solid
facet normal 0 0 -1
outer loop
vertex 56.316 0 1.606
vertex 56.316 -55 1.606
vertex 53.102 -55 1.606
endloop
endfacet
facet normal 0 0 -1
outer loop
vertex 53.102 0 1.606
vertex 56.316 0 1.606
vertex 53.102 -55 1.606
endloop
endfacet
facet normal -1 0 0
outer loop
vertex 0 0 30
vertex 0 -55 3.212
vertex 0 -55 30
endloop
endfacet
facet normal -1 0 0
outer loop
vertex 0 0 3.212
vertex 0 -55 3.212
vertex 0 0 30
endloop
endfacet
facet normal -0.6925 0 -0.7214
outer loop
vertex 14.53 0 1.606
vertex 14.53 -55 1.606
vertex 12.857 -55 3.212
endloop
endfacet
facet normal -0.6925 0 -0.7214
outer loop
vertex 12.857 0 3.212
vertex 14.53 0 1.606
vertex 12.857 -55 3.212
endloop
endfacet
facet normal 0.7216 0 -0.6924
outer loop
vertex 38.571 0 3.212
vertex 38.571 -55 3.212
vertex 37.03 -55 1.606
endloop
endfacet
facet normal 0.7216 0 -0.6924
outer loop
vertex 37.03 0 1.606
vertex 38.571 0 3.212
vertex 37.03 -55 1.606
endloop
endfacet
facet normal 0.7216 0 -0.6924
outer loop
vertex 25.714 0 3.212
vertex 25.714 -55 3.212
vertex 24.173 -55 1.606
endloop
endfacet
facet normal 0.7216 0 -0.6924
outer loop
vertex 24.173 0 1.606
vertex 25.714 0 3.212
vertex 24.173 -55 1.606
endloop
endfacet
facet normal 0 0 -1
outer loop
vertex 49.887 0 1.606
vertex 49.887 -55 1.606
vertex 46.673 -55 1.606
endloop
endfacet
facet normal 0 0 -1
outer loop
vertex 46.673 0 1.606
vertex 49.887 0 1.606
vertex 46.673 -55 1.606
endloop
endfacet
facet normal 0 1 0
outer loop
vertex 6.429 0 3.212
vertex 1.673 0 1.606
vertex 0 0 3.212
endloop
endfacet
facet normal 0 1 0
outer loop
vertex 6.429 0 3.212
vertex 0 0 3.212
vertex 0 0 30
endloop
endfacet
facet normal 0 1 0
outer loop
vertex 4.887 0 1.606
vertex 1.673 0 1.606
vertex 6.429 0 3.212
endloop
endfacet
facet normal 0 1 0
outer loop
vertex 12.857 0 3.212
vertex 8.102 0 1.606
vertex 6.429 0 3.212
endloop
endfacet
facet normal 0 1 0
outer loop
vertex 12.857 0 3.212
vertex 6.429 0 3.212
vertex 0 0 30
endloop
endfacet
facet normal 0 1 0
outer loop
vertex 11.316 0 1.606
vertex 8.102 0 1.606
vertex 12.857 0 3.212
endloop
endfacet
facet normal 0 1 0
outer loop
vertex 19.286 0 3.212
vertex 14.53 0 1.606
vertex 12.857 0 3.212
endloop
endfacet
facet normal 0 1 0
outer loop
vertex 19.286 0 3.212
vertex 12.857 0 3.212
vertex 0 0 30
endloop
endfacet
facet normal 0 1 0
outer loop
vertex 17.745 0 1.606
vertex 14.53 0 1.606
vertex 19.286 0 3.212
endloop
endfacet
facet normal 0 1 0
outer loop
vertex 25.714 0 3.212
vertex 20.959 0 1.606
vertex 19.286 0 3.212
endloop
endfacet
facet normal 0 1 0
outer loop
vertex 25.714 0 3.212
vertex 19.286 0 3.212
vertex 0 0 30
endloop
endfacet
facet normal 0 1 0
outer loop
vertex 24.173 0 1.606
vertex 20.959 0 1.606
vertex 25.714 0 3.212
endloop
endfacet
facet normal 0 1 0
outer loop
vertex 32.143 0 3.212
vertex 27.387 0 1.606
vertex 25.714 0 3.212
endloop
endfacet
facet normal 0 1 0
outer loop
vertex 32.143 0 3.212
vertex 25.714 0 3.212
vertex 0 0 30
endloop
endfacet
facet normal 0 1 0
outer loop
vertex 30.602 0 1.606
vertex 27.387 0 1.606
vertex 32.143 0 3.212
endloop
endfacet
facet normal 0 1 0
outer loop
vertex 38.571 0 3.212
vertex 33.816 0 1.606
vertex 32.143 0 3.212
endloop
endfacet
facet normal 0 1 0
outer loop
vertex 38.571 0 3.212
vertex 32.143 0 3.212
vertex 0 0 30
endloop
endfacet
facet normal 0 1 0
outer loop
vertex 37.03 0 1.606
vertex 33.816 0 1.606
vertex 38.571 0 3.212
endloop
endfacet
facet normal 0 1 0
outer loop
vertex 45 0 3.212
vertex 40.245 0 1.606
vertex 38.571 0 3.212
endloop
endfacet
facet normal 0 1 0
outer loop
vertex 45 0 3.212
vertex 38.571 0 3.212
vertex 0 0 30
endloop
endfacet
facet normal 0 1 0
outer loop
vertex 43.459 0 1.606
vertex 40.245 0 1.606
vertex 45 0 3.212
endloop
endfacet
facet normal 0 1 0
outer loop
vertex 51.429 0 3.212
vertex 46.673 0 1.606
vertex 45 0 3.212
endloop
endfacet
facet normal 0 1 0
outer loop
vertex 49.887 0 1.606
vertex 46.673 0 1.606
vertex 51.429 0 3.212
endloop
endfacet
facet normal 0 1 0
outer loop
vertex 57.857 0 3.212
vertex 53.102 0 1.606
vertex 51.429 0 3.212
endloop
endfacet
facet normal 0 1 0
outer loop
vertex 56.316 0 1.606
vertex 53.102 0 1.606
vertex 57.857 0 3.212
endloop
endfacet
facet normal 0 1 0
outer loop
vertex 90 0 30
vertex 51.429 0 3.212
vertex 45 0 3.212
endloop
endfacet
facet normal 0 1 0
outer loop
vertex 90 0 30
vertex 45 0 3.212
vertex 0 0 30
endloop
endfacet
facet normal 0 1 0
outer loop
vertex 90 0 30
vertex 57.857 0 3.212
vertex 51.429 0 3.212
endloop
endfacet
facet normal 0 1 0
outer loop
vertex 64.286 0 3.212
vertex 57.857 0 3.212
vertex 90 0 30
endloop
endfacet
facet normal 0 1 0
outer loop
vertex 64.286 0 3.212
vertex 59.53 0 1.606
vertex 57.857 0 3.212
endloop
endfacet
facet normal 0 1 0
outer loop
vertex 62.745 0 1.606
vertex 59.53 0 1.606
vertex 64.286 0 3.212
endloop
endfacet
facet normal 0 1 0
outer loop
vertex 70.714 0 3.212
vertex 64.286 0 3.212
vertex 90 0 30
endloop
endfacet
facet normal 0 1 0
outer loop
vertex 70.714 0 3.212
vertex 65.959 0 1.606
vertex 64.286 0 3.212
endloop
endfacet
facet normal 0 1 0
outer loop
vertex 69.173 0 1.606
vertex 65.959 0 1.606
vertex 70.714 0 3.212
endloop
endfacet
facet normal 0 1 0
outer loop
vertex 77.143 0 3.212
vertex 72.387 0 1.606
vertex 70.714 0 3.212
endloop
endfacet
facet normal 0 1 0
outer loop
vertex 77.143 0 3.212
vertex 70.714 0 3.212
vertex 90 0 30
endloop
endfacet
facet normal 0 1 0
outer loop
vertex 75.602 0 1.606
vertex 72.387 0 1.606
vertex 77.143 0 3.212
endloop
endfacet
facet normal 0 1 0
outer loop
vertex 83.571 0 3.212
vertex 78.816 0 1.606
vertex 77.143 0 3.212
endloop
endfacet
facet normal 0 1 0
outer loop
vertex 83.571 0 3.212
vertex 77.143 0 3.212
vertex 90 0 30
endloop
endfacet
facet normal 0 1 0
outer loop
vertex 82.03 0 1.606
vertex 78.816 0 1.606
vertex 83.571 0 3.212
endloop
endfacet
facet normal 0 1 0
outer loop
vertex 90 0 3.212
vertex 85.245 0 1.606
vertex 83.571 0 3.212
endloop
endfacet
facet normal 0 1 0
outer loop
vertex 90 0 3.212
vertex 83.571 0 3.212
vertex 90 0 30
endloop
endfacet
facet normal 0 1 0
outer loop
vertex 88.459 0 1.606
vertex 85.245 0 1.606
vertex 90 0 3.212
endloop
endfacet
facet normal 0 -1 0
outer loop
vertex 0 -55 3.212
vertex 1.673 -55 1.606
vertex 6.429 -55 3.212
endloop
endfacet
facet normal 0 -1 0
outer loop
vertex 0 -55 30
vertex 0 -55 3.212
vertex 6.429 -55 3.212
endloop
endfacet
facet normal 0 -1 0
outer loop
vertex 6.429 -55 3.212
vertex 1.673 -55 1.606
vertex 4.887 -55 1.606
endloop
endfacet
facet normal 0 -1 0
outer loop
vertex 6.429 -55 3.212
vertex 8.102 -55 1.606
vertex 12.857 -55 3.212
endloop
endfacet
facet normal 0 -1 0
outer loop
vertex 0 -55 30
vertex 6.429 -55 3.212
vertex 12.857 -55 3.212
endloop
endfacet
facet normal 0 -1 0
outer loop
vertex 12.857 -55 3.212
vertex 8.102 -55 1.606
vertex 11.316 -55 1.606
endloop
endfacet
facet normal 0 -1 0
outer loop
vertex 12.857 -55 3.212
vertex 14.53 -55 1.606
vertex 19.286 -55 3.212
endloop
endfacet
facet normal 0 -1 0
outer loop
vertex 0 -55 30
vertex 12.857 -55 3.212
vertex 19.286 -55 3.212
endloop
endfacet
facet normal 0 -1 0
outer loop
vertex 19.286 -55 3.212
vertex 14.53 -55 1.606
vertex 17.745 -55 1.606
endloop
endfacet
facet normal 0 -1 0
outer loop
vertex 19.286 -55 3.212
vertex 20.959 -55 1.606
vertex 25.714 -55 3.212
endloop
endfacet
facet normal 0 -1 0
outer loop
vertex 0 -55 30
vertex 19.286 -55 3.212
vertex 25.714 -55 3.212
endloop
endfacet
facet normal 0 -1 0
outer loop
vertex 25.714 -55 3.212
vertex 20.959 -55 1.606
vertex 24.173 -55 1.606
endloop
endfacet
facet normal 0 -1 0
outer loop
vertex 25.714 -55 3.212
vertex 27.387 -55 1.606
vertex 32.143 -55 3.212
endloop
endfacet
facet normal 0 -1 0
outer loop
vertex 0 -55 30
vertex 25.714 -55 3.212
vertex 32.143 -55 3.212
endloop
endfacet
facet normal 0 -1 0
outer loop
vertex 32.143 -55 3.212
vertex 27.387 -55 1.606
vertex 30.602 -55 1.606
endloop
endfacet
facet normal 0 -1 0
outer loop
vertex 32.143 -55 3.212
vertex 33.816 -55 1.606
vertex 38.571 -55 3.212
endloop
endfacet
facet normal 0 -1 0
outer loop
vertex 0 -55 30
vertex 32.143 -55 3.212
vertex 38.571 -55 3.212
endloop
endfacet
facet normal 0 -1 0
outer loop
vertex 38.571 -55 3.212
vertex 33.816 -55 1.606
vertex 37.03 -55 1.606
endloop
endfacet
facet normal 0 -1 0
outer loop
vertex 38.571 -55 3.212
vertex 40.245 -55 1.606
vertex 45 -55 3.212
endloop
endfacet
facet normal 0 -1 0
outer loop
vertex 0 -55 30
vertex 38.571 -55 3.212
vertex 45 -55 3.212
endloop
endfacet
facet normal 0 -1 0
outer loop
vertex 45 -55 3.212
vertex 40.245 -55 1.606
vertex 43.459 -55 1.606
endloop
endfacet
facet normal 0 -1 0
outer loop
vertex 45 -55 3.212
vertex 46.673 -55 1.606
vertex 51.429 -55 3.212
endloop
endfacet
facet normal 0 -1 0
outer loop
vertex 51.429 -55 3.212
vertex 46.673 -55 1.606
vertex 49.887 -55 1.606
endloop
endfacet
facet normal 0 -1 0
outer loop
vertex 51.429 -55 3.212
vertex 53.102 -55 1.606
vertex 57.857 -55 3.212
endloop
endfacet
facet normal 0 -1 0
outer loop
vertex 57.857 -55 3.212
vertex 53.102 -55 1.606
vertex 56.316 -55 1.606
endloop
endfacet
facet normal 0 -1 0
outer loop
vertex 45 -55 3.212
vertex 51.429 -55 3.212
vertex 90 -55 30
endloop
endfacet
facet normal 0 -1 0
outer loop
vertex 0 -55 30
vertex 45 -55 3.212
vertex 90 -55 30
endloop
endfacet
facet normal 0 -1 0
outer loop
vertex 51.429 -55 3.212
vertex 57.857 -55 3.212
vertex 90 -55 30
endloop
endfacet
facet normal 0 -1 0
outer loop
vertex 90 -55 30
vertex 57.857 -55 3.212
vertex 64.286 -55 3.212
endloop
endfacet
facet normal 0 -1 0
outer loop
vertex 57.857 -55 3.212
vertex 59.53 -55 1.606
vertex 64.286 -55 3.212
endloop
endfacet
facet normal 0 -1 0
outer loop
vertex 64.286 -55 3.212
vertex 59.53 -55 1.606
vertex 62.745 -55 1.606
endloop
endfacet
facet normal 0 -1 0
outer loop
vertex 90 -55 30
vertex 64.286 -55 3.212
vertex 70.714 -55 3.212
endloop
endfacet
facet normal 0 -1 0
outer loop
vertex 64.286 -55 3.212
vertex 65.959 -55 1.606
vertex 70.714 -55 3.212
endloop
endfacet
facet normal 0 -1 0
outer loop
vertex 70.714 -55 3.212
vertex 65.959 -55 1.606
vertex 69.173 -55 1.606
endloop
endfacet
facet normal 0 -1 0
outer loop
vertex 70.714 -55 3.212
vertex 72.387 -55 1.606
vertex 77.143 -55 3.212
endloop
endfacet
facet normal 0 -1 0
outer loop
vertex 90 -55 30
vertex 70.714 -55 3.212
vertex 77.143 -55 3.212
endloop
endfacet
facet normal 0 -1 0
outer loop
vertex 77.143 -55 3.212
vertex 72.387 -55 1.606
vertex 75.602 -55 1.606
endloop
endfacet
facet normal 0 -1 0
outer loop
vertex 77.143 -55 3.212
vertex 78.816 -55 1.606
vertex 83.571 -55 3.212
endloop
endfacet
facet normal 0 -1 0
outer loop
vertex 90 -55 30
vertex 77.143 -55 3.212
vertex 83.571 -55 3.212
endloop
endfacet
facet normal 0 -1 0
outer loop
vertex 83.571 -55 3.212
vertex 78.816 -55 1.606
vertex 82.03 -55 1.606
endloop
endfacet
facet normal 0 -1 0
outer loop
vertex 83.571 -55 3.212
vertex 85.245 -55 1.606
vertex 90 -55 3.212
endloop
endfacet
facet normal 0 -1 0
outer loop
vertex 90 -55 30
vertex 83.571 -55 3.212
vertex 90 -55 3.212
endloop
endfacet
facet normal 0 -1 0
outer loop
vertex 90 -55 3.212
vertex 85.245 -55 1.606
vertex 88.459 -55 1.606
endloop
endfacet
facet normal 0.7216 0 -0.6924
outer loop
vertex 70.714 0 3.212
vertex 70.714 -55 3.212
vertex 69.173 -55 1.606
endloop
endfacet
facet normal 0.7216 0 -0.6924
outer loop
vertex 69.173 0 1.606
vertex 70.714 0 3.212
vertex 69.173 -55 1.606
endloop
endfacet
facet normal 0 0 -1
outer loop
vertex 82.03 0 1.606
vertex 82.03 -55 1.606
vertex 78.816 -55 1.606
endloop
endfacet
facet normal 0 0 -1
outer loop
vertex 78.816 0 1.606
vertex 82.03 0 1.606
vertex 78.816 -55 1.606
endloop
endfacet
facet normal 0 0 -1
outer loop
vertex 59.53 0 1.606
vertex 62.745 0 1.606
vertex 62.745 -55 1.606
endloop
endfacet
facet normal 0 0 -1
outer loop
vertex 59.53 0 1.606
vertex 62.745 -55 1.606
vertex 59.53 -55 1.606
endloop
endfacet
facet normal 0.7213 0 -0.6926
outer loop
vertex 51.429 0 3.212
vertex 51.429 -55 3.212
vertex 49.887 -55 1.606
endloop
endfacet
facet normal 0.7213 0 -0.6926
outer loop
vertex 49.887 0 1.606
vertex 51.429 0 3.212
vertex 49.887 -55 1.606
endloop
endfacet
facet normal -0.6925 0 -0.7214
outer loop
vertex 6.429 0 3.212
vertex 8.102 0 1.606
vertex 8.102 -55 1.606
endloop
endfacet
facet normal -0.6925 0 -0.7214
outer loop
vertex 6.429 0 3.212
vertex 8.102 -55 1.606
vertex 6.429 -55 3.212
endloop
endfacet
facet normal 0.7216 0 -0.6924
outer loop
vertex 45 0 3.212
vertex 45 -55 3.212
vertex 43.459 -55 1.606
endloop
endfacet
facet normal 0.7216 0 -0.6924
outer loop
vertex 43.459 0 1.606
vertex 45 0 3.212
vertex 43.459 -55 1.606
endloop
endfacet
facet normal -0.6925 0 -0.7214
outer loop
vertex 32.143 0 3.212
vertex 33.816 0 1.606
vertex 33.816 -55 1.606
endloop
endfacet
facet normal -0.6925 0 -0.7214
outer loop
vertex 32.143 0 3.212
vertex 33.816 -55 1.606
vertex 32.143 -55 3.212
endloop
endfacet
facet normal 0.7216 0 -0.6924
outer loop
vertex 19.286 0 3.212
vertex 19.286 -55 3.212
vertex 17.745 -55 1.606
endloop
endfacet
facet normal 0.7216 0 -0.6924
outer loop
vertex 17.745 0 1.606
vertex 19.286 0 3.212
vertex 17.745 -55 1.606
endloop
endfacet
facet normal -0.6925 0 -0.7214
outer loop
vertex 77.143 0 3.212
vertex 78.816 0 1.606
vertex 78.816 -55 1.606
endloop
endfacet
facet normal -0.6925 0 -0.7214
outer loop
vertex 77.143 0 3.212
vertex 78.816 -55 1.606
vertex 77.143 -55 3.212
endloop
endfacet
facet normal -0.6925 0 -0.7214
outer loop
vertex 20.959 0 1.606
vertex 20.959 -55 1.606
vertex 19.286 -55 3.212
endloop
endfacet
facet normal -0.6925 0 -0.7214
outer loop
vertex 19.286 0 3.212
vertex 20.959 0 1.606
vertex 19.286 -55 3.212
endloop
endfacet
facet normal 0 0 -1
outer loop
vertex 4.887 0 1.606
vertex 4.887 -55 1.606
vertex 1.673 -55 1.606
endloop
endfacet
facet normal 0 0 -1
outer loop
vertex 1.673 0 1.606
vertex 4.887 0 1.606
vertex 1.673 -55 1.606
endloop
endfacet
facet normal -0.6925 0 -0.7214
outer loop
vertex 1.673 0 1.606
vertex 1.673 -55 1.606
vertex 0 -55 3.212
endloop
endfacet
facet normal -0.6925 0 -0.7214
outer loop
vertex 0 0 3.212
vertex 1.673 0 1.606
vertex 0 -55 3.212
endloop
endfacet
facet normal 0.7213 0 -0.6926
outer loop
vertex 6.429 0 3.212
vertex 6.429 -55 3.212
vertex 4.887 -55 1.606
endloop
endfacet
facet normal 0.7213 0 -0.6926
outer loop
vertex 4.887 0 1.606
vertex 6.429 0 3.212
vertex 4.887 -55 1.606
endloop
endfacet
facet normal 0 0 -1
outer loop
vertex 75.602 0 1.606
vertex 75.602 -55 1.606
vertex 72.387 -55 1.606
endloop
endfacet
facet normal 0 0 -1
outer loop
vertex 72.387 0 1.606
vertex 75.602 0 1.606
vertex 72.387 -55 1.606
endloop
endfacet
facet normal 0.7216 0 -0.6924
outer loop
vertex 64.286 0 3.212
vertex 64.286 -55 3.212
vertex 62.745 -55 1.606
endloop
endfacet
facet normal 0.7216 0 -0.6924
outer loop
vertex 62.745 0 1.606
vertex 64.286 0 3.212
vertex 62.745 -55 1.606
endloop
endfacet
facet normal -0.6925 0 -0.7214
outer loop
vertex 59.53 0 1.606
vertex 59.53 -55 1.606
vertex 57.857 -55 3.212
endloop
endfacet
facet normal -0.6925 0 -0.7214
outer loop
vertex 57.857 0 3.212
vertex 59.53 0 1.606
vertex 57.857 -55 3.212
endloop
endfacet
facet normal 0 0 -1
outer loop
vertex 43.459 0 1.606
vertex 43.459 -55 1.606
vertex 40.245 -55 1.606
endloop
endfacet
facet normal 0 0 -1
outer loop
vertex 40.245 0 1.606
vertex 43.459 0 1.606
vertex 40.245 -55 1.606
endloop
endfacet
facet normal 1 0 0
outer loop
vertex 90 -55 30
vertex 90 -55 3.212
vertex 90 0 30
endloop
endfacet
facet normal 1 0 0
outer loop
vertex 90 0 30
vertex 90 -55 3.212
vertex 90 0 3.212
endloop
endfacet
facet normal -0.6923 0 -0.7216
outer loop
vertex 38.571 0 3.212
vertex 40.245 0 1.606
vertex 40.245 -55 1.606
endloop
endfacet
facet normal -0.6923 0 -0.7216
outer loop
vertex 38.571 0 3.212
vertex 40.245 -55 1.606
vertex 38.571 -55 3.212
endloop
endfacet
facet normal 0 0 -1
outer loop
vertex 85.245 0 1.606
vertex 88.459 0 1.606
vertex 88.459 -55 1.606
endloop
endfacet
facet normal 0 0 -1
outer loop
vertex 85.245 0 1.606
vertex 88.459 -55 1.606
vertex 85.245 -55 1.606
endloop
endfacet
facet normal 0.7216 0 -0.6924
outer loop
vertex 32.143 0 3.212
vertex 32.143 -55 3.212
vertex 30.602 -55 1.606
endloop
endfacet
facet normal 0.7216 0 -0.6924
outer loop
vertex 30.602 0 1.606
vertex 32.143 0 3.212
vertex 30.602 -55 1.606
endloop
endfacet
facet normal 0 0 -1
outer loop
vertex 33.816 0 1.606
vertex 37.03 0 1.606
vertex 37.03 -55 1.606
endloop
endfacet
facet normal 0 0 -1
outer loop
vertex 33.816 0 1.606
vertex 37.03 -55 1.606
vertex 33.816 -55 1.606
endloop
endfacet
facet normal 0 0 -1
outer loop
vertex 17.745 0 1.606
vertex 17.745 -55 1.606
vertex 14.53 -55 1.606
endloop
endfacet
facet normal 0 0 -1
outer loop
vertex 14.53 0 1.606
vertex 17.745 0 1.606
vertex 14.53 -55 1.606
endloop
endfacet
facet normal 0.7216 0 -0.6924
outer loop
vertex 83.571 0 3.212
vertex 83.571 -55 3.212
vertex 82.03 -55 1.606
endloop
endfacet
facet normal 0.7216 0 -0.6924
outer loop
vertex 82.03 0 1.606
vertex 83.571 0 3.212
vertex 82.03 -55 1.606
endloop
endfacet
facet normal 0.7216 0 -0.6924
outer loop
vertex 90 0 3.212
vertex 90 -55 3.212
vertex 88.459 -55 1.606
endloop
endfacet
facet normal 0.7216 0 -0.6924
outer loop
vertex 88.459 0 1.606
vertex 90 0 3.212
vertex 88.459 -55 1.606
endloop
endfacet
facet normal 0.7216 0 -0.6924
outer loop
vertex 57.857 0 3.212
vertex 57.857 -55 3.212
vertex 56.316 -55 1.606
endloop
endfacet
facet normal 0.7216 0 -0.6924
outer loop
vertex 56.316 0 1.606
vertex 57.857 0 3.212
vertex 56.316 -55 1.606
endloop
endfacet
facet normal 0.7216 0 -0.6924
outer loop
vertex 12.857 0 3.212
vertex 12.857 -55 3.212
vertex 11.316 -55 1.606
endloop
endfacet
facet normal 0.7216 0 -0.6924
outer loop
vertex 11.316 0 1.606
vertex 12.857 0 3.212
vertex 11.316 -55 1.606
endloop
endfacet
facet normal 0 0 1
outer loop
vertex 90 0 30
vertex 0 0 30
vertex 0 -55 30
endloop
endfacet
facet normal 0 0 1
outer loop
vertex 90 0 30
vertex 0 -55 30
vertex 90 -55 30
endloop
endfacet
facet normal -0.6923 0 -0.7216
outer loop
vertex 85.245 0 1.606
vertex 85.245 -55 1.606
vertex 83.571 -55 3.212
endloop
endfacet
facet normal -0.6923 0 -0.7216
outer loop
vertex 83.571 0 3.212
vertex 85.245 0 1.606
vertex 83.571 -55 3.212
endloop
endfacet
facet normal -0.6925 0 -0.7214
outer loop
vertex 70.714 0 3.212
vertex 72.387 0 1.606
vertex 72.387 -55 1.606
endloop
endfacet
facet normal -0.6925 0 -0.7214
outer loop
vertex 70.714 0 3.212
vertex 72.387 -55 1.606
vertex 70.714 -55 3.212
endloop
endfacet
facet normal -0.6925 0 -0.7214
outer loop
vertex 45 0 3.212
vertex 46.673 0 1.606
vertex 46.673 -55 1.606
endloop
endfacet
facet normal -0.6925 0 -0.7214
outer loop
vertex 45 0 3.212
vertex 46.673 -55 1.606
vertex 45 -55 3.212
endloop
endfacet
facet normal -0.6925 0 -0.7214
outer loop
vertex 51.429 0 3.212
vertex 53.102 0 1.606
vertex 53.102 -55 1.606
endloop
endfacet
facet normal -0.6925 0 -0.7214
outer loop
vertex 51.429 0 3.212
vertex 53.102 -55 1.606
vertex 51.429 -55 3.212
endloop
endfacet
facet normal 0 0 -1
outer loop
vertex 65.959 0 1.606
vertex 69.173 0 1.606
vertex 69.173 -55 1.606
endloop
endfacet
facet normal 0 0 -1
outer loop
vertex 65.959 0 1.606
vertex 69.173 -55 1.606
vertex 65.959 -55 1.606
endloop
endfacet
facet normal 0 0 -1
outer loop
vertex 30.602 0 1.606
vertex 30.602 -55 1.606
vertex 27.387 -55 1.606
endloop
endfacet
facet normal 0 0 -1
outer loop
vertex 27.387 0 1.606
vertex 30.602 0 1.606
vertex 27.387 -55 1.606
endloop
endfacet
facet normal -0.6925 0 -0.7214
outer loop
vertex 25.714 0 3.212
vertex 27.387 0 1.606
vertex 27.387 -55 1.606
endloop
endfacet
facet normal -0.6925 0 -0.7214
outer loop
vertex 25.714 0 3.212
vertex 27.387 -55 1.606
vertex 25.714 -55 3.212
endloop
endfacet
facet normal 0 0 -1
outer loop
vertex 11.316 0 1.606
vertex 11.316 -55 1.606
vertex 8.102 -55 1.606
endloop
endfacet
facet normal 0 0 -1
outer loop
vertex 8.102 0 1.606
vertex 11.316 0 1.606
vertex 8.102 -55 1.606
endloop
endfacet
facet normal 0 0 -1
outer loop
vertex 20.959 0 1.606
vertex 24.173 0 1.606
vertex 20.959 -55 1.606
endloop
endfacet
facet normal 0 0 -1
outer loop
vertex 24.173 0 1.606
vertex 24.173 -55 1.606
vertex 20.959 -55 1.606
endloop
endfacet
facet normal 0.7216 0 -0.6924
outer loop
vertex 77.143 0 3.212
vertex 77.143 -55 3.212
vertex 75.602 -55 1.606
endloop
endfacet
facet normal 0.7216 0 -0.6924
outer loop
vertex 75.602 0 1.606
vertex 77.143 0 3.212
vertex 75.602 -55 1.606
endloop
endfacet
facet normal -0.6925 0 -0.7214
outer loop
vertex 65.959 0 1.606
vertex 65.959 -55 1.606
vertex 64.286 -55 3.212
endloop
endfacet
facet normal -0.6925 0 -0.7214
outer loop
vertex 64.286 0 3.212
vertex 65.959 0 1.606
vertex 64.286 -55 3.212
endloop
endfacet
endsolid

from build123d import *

# Parameters (mm, degrees)
F0_W     = 90
F0_H     = 55
F1_DEPTH = 30
F3_DEPTH = 90
F5_DEPTH = 60


with BuildPart() as f1:
    # F0 (on Top) → F1 (new body)
    with BuildSketch(Plane.XY):
        with Locations((45, -27.5)):
            Rectangle(F0_W, F0_H)
    extrude(amount=F1_DEPTH)

    # F2 (on face) → F3 (cut)
    with BuildSketch(Plane.XZ.offset(55)):
        Polygon((3.3461908971, 0), (0, 3.2115780663), (0, 0), align=None)
        Polygon((6.4285714286, 3.2115780663), (3.3461908971, 0), (9.7747623256, 0), align=None)
        Polygon((12.8571428571, 3.2115780663), (9.7747623256, 0), (16.2033337542, 0), align=None)
        Polygon((19.2857142857, 3.2115780663), (16.2033337542, 0), (22.6319051828, 0), align=None)
        Polygon((25.7142857143, 3.2115780663), (22.6319051828, 0), (29.0604766113, 0), align=None)
        Polygon((32.1428571429, 3.2115780663), (29.0604766113, 0), (35.4890480399, 0), align=None)
        Polygon((38.5714285714, 3.2115780663), (35.4890480399, 0), (41.9176194685, 0), align=None)
        Polygon((45, 3.2115780663), (41.9176194685, 0), (48.3461908971, 0), align=None)
        Polygon((51.4285714286, 3.2115780663), (48.3461908971, 0), (54.7747623256, 0), align=None)
        Polygon((54.7747623256, 0), (61.2033337542, 0), (57.8571428571, 3.2115780663), align=None)
        Polygon((61.2033337542, 0), (67.6319051828, 0), (64.2857142857, 3.2115780663), align=None)
        Polygon((67.6319051828, 0), (74.0604766113, 0), (70.7142857143, 3.2115780663), align=None)
        Polygon((74.0604766113, 0), (80.4890480399, 0), (77.1428571429, 3.2115780663), align=None)
        Polygon((80.4890480399, 0), (86.9176194685, 0), (83.5714285714, 3.2115780663), align=None)
        Polygon((90, 0), (90, 3.2115780663), (86.9176194685, 0), align=None)
    extrude(amount=-F3_DEPTH, mode=Mode.SUBTRACT)

    # F4 (on face) → F5 (cut)
    with BuildSketch(Plane.XZ.offset(55)):
        Polygon((0, 1.6057890331), (0, 0), (3.3461908971, 0), (1.6730954485, 1.6057890331), align=None)
        Polygon((90, 1.6057890331), (88.4588097342, 1.6057890331), (86.9176194685, 0), (90, 0), align=None)
        Polygon((4.8873811628, 1.6057890331), (3.3461908971, 0), (9.7747623256, 0), (8.1016668771, 1.6057890331), align=None)
        Polygon((11.3159525914, 1.6057890331), (9.7747623256, 0), (16.2033337542, 0), (14.5302383057, 1.6057890331), align=None)
        Polygon((24.1730954485, 1.6057890331), (22.6319051828, 0), (29.0604766113, 0), (27.3873811628, 1.6057890331), align=None)
        Polygon((30.6016668771, 1.6057890331), (29.0604766113, 0), (35.4890480399, 0), (33.8159525914, 1.6057890331), align=None)
        Polygon((37.0302383057, 1.6057890331), (35.4890480399, 0), (41.9176194685, 0), (40.24452402, 1.6057890331), align=None)
        Polygon((43.4588097342, 1.6057890331), (41.9176194685, 0), (48.3461908971, 0), (46.6730954485, 1.6057890331), align=None)
        Polygon((49.8873811628, 1.6057890331), (48.3461908971, 0), (54.7747623256, 0), (53.1016668771, 1.6057890331), align=None)
        Polygon((56.3159525914, 1.6057890331), (54.7747623256, 0), (61.2033337542, 0), (59.5302383057, 1.6057890331), align=None)
        Polygon((62.74452402, 1.6057890331), (61.2033337542, 0), (67.6319051828, 0), (65.9588097342, 1.6057890331), align=None)
        Polygon((67.6319051828, 0), (74.0604766113, 0), (72.3873811628, 1.6057890331), (69.1730954485, 1.6057890331), align=None)
        Polygon((74.0604766113, 0), (80.4890480399, 0), (78.8159525914, 1.6057890331), (75.6016668771, 1.6057890331), align=None)
        Polygon((86.9176194685, 0), (85.24452402, 1.6057890331), (82.0302383057, 1.6057890331), (80.4890480399, 0), align=None)
        Polygon((1.6730954485, 1.6057890331), (3.3461908971, 0), (4.8873811628, 1.6057890331), align=None)
        Polygon((8.1016668771, 1.6057890331), (9.7747623256, 0), (11.3159525914, 1.6057890331), align=None)
        Polygon((14.5302383057, 1.6057890331), (16.2033337542, 0), (17.74452402, 1.6057890331), align=None)
        Polygon((20.9588097342, 1.6057890331), (22.6319051828, 0), (24.1730954485, 1.6057890331), align=None)
        Polygon((27.3873811628, 1.6057890331), (29.0604766113, 0), (30.6016668771, 1.6057890331), align=None)
        Polygon((33.8159525914, 1.6057890331), (35.4890480399, 0), (37.0302383057, 1.6057890331), align=None)
        Polygon((40.24452402, 1.6057890331), (41.9176194685, 0), (43.4588097342, 1.6057890331), align=None)
        Polygon((46.6730954485, 1.6057890331), (48.3461908971, 0), (49.8873811628, 1.6057890331), align=None)
        Polygon((53.1016668771, 1.6057890331), (54.7747623256, 0), (56.3159525914, 1.6057890331), align=None)
        Polygon((59.5302383057, 1.6057890331), (61.2033337542, 0), (62.74452402, 1.6057890331), align=None)
        Polygon((65.9588097342, 1.6057890331), (67.6319051828, 0), (69.1730954485, 1.6057890331), align=None)
        Polygon((72.3873811628, 1.6057890331), (74.0604766113, 0), (75.6016668771, 1.6057890331), align=None)
        Polygon((80.4890480399, 0), (82.0302383057, 1.6057890331), (78.8159525914, 1.6057890331), align=None)
        Polygon((86.9176194685, 0), (88.4588097342, 1.6057890331), (85.24452402, 1.6057890331), align=None)
    extrude(amount=-F5_DEPTH, mode=Mode.SUBTRACT)


solid = f1.part
